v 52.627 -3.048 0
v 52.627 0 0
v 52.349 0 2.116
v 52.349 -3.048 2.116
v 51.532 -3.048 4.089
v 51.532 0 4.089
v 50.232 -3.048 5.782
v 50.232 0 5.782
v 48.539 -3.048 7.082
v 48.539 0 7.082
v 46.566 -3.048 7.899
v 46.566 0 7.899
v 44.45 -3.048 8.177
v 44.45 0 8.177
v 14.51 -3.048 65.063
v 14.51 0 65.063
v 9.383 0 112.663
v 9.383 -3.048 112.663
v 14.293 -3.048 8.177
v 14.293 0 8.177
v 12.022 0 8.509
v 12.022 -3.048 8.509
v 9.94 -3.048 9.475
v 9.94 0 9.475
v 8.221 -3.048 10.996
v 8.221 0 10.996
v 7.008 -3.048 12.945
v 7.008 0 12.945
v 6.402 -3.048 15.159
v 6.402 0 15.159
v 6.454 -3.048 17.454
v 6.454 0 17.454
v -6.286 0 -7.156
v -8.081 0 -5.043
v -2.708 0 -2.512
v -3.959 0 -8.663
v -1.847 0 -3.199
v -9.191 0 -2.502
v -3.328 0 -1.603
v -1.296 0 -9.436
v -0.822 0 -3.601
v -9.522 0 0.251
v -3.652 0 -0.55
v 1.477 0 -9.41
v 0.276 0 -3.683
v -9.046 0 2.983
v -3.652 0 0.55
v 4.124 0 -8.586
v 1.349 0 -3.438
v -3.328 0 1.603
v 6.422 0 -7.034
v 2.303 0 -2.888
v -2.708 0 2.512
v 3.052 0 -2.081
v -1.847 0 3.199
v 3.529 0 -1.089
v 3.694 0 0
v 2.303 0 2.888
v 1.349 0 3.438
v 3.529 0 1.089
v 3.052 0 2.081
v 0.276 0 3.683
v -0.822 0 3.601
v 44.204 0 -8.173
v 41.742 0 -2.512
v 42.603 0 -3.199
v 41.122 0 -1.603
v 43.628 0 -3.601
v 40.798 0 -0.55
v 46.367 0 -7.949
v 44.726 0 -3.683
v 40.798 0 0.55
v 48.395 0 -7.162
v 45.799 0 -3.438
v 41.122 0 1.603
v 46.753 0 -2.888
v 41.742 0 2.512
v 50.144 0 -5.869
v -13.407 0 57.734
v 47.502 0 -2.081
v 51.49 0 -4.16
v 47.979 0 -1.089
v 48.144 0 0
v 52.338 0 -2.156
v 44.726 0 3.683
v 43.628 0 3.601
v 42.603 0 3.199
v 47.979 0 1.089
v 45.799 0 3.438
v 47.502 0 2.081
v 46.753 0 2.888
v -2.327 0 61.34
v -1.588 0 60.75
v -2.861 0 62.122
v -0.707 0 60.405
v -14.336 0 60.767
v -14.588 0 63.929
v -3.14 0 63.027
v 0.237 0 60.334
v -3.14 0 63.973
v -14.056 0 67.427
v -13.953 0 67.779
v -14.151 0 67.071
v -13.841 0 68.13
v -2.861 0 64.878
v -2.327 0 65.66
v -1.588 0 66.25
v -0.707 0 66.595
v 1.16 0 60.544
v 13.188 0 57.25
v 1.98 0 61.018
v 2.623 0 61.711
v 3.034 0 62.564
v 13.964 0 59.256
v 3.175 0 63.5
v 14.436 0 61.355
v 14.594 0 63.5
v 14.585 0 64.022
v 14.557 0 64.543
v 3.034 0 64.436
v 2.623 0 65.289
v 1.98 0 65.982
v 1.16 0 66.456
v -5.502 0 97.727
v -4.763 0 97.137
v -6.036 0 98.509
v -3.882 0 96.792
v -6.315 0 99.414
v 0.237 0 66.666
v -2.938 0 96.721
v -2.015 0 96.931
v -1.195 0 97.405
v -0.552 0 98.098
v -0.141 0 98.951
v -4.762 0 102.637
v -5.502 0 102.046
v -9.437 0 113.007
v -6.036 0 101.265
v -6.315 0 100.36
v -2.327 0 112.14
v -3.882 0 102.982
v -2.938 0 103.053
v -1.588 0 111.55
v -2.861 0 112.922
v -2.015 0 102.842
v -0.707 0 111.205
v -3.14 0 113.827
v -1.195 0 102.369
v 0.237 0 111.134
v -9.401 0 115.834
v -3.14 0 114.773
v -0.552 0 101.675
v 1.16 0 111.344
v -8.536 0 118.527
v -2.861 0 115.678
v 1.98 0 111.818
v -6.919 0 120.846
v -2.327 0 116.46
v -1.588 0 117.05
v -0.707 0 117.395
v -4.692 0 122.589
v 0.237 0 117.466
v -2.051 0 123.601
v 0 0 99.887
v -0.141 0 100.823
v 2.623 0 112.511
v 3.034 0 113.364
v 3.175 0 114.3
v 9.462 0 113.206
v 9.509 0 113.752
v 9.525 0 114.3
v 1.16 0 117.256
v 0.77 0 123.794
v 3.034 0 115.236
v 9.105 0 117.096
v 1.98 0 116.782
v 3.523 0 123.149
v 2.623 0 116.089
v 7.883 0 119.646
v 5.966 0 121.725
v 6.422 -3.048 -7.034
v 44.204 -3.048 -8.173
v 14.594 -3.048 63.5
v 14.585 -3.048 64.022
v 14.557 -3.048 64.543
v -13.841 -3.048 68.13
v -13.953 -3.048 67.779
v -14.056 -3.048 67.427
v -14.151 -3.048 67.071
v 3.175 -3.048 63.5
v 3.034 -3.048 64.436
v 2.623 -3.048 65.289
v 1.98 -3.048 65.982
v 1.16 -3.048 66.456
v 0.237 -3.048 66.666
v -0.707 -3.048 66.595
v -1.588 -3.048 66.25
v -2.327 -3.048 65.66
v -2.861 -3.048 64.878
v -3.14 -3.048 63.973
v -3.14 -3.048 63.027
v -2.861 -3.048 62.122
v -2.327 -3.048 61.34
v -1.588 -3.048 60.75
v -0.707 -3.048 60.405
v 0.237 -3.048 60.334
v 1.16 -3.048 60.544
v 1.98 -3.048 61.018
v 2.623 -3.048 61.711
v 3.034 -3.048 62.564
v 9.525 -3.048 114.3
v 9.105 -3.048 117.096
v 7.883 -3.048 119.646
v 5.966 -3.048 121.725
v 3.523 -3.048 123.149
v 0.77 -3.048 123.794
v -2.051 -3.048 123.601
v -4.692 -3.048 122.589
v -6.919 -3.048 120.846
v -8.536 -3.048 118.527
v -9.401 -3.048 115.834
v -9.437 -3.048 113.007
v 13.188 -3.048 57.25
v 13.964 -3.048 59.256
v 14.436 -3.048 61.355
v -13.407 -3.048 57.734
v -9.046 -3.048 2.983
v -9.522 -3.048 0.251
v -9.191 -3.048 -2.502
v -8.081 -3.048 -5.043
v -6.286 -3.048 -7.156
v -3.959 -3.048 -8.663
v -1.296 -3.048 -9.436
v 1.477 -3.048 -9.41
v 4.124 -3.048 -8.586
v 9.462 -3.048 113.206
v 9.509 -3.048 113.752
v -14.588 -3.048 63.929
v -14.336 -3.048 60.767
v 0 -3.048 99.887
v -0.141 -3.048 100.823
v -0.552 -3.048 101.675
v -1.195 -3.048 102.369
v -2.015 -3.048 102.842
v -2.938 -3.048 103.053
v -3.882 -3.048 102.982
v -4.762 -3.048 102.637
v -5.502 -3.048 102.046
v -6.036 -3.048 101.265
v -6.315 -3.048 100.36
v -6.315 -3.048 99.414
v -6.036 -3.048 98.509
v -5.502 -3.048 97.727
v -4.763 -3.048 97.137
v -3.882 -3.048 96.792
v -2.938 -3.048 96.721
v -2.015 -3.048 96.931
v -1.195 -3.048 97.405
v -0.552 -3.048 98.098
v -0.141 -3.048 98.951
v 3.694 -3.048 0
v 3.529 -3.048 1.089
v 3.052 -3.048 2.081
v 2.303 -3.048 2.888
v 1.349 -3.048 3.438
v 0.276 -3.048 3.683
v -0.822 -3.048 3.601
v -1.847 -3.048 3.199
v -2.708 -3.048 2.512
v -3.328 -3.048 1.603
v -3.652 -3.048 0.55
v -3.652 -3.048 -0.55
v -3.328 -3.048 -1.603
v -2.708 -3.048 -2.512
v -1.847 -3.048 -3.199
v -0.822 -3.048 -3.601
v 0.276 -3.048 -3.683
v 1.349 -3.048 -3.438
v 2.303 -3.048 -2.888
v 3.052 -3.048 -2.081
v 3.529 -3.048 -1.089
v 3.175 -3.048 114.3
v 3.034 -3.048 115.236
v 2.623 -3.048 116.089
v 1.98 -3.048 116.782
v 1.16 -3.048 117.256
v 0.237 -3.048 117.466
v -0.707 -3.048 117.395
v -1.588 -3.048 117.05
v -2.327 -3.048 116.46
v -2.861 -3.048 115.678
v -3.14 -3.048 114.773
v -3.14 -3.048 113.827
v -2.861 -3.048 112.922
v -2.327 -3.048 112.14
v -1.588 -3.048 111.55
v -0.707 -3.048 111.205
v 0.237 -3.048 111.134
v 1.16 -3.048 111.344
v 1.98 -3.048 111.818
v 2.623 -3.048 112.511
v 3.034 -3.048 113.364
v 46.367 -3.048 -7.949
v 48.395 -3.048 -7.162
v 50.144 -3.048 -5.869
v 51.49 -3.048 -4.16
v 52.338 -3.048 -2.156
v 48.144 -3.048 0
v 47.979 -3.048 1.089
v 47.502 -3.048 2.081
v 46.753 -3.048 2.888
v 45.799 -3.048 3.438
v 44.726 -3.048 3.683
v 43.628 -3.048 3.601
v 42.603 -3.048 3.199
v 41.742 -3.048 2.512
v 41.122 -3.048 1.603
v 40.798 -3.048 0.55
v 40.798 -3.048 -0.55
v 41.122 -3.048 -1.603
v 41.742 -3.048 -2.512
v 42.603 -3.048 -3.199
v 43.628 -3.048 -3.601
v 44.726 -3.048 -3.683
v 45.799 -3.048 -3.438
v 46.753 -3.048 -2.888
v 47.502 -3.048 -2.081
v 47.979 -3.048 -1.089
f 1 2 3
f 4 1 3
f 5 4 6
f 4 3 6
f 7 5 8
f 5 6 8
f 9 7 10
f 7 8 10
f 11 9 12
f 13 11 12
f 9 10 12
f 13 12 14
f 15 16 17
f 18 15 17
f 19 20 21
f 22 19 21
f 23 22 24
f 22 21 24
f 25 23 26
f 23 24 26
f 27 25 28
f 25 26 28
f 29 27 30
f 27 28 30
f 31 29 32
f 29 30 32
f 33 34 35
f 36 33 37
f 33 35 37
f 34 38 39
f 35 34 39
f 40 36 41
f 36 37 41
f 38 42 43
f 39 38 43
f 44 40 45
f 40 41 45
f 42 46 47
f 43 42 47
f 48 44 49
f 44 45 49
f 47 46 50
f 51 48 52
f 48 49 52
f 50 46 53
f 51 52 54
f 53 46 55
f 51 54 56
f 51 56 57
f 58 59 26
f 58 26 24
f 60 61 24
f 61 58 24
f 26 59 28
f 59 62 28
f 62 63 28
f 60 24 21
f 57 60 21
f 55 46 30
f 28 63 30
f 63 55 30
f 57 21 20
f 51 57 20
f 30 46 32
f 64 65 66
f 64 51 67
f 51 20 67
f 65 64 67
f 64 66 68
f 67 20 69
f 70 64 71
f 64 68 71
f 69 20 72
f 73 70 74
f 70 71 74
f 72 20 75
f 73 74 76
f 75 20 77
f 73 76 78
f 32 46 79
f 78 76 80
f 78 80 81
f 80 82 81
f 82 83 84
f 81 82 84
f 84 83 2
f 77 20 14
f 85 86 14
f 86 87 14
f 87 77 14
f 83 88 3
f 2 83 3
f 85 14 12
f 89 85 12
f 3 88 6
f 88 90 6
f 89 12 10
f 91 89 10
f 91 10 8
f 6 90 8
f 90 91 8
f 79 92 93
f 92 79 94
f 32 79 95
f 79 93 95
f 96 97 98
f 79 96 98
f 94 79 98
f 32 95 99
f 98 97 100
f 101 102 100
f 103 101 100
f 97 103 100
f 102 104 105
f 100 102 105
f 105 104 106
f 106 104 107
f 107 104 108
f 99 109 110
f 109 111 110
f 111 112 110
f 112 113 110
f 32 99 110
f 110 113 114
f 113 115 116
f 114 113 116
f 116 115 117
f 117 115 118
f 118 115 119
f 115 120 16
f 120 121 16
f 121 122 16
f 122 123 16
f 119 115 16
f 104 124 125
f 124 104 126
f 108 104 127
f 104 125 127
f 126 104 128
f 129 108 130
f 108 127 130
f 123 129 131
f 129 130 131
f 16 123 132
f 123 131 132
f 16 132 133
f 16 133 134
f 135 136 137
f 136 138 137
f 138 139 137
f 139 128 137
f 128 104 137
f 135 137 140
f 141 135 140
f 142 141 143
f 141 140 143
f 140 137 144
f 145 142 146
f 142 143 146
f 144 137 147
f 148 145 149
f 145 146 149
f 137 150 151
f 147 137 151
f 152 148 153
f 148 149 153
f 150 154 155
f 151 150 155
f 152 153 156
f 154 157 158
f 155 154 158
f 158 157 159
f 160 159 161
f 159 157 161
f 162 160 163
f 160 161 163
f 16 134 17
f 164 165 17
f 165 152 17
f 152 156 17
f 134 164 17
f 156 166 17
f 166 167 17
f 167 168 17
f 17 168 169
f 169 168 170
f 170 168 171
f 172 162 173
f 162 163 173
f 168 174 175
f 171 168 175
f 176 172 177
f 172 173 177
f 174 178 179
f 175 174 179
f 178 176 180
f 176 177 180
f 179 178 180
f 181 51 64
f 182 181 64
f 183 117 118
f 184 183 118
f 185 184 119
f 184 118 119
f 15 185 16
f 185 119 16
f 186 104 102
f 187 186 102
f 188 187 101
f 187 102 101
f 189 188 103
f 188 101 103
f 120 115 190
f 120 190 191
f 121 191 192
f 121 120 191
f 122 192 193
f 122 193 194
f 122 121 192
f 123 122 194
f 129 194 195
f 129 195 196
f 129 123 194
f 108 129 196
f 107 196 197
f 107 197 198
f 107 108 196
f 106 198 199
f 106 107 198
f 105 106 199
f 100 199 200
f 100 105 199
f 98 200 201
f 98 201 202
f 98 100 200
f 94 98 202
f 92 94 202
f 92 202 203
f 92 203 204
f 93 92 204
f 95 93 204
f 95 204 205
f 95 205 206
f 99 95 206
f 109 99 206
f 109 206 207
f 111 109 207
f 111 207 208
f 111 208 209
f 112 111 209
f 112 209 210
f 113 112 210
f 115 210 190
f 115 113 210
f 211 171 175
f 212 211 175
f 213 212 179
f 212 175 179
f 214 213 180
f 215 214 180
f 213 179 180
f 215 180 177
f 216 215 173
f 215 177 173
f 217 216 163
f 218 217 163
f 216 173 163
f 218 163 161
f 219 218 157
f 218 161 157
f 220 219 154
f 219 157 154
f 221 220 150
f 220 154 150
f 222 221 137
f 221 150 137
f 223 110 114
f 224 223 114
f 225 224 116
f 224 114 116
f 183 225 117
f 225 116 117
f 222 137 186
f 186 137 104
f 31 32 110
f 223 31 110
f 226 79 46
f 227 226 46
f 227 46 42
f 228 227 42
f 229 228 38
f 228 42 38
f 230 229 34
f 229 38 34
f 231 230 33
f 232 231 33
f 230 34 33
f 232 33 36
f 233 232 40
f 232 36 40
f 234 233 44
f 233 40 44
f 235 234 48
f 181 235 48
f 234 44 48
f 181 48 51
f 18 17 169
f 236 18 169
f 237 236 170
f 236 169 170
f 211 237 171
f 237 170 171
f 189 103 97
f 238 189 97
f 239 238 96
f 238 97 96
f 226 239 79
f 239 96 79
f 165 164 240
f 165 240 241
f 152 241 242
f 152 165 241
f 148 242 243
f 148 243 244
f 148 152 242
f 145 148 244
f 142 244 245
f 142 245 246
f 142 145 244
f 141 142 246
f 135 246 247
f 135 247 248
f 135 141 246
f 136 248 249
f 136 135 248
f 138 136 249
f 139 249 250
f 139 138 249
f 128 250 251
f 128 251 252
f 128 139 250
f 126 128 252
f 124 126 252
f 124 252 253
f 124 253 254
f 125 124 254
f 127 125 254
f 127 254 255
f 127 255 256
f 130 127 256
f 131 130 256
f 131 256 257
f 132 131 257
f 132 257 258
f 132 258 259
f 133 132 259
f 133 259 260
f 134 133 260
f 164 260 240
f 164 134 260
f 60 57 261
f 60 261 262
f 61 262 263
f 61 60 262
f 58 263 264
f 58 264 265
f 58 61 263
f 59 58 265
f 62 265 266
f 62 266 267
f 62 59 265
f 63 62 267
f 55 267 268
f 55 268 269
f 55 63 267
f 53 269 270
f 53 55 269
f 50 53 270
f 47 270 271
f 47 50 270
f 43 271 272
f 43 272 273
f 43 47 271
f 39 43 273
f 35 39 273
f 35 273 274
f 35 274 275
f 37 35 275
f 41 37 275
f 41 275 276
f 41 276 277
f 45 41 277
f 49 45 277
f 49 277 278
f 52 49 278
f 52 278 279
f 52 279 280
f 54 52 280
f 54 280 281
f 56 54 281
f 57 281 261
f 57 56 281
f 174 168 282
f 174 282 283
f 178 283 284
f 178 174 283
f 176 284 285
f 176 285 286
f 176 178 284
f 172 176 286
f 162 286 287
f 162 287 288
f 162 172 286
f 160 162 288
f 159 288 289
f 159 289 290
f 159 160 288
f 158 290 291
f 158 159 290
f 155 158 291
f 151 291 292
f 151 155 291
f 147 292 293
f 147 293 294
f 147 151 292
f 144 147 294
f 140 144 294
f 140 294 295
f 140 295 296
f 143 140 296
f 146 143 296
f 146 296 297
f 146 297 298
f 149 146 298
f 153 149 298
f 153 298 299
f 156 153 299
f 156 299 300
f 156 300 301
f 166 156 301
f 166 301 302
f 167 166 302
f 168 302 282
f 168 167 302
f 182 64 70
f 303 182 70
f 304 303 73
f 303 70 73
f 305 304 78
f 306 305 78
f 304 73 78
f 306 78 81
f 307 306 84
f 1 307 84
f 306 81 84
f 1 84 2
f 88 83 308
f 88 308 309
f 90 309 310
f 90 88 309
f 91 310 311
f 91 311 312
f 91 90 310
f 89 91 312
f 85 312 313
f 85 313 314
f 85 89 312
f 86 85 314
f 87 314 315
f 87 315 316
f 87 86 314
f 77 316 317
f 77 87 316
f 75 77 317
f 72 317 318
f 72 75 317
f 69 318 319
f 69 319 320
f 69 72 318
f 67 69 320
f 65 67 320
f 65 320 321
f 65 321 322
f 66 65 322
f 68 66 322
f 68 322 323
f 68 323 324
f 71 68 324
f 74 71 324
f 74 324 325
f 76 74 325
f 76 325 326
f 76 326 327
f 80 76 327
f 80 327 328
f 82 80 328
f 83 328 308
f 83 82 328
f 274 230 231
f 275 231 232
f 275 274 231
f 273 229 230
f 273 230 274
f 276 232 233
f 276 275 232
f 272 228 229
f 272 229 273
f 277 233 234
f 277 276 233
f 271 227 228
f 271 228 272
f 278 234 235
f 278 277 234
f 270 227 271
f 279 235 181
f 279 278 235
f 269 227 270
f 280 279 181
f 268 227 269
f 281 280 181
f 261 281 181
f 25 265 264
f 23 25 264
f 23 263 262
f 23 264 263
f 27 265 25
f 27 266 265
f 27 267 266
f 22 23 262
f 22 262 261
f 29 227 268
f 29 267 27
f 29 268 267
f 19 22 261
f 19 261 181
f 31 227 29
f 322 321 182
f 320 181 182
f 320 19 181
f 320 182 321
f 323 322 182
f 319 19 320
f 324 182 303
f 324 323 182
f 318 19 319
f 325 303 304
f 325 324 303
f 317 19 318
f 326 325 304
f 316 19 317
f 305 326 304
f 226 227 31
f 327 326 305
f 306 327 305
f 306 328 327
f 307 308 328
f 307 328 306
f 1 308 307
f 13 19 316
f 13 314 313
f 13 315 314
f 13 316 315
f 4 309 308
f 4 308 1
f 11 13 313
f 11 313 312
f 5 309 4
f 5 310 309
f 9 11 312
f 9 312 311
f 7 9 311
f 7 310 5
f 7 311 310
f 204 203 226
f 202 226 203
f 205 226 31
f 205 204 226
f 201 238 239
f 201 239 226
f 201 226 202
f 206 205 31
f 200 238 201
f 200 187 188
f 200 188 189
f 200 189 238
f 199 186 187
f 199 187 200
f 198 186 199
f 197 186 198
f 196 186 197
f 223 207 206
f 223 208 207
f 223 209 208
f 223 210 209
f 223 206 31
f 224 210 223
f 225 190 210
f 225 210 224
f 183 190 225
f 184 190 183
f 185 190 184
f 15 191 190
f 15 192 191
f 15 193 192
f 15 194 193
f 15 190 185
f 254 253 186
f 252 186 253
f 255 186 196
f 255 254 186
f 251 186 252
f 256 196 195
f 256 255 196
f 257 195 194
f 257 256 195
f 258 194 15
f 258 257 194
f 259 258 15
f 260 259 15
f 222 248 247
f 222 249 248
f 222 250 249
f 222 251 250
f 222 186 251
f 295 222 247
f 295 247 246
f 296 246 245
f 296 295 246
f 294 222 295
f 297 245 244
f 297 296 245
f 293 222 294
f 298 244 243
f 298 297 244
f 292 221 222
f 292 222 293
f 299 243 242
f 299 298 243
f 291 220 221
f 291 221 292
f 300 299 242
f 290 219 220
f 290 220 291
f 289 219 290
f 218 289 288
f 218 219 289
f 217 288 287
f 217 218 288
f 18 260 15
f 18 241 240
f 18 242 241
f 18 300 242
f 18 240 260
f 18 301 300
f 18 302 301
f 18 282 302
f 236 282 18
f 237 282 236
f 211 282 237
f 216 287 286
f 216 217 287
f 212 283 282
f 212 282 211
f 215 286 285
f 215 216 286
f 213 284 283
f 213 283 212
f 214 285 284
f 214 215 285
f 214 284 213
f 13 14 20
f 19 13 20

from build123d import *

# Parameters (mm, degrees)
F0_R     = 3.175
F0_R_2   = 3.6935498759
F1_DEPTH = 3.048


# Not quite as in the source:
# - the program builds the solid bodies; features that only make, move or delete a surface that nothing else refers to are left out


with BuildPart() as f1:
    # F0 (on Front) → F1 (new body)
    with BuildSketch(Plane.XZ):
        with BuildLine():
            ThreePointArc((9.3833145649, 112.6632248852), (9.4895125331, 113.4785519586), (9.525, 114.3))
            ThreePointArc((9.525, 114.3), (-0.6480489734, 123.8029288921), (-9.4368178537, 113.0069053411))
            ThreePointArc((-9.4368178537, 113.0069053411), (-0.1739100757, 104.7765877814), (9.3833145649, 112.6632248852))
        make_face()
        with Locations((0, 114.3)):
            Circle(F0_R, mode=Mode.SUBTRACT)
        with BuildLine():
            ThreePointArc((9.3833145649, 112.6632248852), (-0.1739100757, 104.7765877814), (-9.4368178537, 113.0069053411))
            Line((-9.4368178537, 113.0069053411), (-13.8405466215, 68.1295922048))
            ThreePointArc((-13.8405466215, 68.1295922048), (1.5694846966, 78.00967169), (14.510379821, 65.0629242514))
            Line((14.510379821, 65.0629242514), (9.3833145649, 112.6632248852))
        make_face()
        with Locations((-3.175, 99.886942851)):
            Circle(F0_R, mode=Mode.SUBTRACT)
        with BuildLine():
            ThreePointArc((14.510379821, 65.0629242514), (1.5694846966, 78.00967169), (-13.8405466215, 68.1295922048))
            ThreePointArc((-13.8405466215, 68.1295922048), (-14.0055954943, 67.6033095928), (-14.1506404779, 67.0711663123))
            Line((-14.1506404779, 67.0711663123), (-13.406906479, 57.7338302637))
            ThreePointArc((-13.406906479, 57.7338302637), (-0.26538464, 48.9081041068), (13.1883694151, 57.2501386467))
            Line((13.1883694151, 57.2501386467), (14.510379821, 65.0629242514))
        make_face()
        with Locations((0, 63.5)):
            Circle(F0_R, mode=Mode.SUBTRACT)
        with BuildLine():
            ThreePointArc((14.5943089855, 63.5), (14.5733115895, 64.2825880654), (14.510379821, 65.0629242514))
            Line((14.510379821, 65.0629242514), (13.1883694151, 57.2501386467))
            ThreePointArc((13.1883694151, 57.2501386467), (14.2384864544, 60.2969767012), (14.5943089855, 63.5))
        make_face()
        with BuildLine():
            Line((-13.406906479, 57.7338302637), (-14.1506404779, 67.0711663123))
            ThreePointArc((-14.1506404779, 67.0711663123), (-14.5482321844, 62.3412096509), (-13.406906479, 57.7338302637))
        make_face()
        with BuildLine():
            Line((6.4543763873, 17.4537470642), (13.1883694151, 57.2501386467))
            ThreePointArc((13.1883694151, 57.2501386467), (-0.26538464, 48.9081041068), (-13.406906479, 57.7338302637))
            Line((-13.406906479, 57.7338302637), (-9.0459006939, 2.9828351674))
            ThreePointArc((-9.0459006939, 2.9828351674), (1.5105331659, 9.4044624809), (9.525, 0))
            ThreePointArc((9.525, 0), (8.7148100466, -3.8441788267), (6.4220685875, -7.0343912357))
            Line((6.4220685875, -7.0343912357), (44.2035880522, -8.173426155))
            ThreePointArc((44.2035880522, -8.173426155), (36.2737887259, 0.1232199644), (44.45, 8.1771397175))
            Line((44.45, 8.1771397175), (14.2931469281, 8.1771397175))
            ThreePointArc((14.2931469281, 8.1771397175), (8.220631645, 10.996039865), (6.4543763873, 17.4537470642))
        make_face()
        with BuildLine():
            ThreePointArc((9.525, 0), (1.5105331659, 9.4044624809), (-9.0459006939, 2.9828351674))
            ThreePointArc((-9.0459006939, 2.9828351674), (-5.1775795439, -7.9948918108), (6.4220685875, -7.0343912357))
            ThreePointArc((6.4220685875, -7.0343912357), (8.7148100466, -3.8441788267), (9.525, 0))
        make_face()
        Circle(F0_R_2, mode=Mode.SUBTRACT)
        with BuildLine():
            ThreePointArc((52.6271397175, 0), (50.2321109449, 5.7821109449), (44.45, 8.1771397175))
            ThreePointArc((44.45, 8.1771397175), (36.2737887259, 0.1232199644), (44.2035880522, -8.173426155))
            ThreePointArc((44.2035880522, -8.173426155), (50.1443247639, -5.8685841088), (52.6271397175, 0))
        make_face()
        with Locations((44.45, 0)):
            Circle(F0_R_2, mode=Mode.SUBTRACT)
    extrude(amount=F1_DEPTH)


solid = f1.part
